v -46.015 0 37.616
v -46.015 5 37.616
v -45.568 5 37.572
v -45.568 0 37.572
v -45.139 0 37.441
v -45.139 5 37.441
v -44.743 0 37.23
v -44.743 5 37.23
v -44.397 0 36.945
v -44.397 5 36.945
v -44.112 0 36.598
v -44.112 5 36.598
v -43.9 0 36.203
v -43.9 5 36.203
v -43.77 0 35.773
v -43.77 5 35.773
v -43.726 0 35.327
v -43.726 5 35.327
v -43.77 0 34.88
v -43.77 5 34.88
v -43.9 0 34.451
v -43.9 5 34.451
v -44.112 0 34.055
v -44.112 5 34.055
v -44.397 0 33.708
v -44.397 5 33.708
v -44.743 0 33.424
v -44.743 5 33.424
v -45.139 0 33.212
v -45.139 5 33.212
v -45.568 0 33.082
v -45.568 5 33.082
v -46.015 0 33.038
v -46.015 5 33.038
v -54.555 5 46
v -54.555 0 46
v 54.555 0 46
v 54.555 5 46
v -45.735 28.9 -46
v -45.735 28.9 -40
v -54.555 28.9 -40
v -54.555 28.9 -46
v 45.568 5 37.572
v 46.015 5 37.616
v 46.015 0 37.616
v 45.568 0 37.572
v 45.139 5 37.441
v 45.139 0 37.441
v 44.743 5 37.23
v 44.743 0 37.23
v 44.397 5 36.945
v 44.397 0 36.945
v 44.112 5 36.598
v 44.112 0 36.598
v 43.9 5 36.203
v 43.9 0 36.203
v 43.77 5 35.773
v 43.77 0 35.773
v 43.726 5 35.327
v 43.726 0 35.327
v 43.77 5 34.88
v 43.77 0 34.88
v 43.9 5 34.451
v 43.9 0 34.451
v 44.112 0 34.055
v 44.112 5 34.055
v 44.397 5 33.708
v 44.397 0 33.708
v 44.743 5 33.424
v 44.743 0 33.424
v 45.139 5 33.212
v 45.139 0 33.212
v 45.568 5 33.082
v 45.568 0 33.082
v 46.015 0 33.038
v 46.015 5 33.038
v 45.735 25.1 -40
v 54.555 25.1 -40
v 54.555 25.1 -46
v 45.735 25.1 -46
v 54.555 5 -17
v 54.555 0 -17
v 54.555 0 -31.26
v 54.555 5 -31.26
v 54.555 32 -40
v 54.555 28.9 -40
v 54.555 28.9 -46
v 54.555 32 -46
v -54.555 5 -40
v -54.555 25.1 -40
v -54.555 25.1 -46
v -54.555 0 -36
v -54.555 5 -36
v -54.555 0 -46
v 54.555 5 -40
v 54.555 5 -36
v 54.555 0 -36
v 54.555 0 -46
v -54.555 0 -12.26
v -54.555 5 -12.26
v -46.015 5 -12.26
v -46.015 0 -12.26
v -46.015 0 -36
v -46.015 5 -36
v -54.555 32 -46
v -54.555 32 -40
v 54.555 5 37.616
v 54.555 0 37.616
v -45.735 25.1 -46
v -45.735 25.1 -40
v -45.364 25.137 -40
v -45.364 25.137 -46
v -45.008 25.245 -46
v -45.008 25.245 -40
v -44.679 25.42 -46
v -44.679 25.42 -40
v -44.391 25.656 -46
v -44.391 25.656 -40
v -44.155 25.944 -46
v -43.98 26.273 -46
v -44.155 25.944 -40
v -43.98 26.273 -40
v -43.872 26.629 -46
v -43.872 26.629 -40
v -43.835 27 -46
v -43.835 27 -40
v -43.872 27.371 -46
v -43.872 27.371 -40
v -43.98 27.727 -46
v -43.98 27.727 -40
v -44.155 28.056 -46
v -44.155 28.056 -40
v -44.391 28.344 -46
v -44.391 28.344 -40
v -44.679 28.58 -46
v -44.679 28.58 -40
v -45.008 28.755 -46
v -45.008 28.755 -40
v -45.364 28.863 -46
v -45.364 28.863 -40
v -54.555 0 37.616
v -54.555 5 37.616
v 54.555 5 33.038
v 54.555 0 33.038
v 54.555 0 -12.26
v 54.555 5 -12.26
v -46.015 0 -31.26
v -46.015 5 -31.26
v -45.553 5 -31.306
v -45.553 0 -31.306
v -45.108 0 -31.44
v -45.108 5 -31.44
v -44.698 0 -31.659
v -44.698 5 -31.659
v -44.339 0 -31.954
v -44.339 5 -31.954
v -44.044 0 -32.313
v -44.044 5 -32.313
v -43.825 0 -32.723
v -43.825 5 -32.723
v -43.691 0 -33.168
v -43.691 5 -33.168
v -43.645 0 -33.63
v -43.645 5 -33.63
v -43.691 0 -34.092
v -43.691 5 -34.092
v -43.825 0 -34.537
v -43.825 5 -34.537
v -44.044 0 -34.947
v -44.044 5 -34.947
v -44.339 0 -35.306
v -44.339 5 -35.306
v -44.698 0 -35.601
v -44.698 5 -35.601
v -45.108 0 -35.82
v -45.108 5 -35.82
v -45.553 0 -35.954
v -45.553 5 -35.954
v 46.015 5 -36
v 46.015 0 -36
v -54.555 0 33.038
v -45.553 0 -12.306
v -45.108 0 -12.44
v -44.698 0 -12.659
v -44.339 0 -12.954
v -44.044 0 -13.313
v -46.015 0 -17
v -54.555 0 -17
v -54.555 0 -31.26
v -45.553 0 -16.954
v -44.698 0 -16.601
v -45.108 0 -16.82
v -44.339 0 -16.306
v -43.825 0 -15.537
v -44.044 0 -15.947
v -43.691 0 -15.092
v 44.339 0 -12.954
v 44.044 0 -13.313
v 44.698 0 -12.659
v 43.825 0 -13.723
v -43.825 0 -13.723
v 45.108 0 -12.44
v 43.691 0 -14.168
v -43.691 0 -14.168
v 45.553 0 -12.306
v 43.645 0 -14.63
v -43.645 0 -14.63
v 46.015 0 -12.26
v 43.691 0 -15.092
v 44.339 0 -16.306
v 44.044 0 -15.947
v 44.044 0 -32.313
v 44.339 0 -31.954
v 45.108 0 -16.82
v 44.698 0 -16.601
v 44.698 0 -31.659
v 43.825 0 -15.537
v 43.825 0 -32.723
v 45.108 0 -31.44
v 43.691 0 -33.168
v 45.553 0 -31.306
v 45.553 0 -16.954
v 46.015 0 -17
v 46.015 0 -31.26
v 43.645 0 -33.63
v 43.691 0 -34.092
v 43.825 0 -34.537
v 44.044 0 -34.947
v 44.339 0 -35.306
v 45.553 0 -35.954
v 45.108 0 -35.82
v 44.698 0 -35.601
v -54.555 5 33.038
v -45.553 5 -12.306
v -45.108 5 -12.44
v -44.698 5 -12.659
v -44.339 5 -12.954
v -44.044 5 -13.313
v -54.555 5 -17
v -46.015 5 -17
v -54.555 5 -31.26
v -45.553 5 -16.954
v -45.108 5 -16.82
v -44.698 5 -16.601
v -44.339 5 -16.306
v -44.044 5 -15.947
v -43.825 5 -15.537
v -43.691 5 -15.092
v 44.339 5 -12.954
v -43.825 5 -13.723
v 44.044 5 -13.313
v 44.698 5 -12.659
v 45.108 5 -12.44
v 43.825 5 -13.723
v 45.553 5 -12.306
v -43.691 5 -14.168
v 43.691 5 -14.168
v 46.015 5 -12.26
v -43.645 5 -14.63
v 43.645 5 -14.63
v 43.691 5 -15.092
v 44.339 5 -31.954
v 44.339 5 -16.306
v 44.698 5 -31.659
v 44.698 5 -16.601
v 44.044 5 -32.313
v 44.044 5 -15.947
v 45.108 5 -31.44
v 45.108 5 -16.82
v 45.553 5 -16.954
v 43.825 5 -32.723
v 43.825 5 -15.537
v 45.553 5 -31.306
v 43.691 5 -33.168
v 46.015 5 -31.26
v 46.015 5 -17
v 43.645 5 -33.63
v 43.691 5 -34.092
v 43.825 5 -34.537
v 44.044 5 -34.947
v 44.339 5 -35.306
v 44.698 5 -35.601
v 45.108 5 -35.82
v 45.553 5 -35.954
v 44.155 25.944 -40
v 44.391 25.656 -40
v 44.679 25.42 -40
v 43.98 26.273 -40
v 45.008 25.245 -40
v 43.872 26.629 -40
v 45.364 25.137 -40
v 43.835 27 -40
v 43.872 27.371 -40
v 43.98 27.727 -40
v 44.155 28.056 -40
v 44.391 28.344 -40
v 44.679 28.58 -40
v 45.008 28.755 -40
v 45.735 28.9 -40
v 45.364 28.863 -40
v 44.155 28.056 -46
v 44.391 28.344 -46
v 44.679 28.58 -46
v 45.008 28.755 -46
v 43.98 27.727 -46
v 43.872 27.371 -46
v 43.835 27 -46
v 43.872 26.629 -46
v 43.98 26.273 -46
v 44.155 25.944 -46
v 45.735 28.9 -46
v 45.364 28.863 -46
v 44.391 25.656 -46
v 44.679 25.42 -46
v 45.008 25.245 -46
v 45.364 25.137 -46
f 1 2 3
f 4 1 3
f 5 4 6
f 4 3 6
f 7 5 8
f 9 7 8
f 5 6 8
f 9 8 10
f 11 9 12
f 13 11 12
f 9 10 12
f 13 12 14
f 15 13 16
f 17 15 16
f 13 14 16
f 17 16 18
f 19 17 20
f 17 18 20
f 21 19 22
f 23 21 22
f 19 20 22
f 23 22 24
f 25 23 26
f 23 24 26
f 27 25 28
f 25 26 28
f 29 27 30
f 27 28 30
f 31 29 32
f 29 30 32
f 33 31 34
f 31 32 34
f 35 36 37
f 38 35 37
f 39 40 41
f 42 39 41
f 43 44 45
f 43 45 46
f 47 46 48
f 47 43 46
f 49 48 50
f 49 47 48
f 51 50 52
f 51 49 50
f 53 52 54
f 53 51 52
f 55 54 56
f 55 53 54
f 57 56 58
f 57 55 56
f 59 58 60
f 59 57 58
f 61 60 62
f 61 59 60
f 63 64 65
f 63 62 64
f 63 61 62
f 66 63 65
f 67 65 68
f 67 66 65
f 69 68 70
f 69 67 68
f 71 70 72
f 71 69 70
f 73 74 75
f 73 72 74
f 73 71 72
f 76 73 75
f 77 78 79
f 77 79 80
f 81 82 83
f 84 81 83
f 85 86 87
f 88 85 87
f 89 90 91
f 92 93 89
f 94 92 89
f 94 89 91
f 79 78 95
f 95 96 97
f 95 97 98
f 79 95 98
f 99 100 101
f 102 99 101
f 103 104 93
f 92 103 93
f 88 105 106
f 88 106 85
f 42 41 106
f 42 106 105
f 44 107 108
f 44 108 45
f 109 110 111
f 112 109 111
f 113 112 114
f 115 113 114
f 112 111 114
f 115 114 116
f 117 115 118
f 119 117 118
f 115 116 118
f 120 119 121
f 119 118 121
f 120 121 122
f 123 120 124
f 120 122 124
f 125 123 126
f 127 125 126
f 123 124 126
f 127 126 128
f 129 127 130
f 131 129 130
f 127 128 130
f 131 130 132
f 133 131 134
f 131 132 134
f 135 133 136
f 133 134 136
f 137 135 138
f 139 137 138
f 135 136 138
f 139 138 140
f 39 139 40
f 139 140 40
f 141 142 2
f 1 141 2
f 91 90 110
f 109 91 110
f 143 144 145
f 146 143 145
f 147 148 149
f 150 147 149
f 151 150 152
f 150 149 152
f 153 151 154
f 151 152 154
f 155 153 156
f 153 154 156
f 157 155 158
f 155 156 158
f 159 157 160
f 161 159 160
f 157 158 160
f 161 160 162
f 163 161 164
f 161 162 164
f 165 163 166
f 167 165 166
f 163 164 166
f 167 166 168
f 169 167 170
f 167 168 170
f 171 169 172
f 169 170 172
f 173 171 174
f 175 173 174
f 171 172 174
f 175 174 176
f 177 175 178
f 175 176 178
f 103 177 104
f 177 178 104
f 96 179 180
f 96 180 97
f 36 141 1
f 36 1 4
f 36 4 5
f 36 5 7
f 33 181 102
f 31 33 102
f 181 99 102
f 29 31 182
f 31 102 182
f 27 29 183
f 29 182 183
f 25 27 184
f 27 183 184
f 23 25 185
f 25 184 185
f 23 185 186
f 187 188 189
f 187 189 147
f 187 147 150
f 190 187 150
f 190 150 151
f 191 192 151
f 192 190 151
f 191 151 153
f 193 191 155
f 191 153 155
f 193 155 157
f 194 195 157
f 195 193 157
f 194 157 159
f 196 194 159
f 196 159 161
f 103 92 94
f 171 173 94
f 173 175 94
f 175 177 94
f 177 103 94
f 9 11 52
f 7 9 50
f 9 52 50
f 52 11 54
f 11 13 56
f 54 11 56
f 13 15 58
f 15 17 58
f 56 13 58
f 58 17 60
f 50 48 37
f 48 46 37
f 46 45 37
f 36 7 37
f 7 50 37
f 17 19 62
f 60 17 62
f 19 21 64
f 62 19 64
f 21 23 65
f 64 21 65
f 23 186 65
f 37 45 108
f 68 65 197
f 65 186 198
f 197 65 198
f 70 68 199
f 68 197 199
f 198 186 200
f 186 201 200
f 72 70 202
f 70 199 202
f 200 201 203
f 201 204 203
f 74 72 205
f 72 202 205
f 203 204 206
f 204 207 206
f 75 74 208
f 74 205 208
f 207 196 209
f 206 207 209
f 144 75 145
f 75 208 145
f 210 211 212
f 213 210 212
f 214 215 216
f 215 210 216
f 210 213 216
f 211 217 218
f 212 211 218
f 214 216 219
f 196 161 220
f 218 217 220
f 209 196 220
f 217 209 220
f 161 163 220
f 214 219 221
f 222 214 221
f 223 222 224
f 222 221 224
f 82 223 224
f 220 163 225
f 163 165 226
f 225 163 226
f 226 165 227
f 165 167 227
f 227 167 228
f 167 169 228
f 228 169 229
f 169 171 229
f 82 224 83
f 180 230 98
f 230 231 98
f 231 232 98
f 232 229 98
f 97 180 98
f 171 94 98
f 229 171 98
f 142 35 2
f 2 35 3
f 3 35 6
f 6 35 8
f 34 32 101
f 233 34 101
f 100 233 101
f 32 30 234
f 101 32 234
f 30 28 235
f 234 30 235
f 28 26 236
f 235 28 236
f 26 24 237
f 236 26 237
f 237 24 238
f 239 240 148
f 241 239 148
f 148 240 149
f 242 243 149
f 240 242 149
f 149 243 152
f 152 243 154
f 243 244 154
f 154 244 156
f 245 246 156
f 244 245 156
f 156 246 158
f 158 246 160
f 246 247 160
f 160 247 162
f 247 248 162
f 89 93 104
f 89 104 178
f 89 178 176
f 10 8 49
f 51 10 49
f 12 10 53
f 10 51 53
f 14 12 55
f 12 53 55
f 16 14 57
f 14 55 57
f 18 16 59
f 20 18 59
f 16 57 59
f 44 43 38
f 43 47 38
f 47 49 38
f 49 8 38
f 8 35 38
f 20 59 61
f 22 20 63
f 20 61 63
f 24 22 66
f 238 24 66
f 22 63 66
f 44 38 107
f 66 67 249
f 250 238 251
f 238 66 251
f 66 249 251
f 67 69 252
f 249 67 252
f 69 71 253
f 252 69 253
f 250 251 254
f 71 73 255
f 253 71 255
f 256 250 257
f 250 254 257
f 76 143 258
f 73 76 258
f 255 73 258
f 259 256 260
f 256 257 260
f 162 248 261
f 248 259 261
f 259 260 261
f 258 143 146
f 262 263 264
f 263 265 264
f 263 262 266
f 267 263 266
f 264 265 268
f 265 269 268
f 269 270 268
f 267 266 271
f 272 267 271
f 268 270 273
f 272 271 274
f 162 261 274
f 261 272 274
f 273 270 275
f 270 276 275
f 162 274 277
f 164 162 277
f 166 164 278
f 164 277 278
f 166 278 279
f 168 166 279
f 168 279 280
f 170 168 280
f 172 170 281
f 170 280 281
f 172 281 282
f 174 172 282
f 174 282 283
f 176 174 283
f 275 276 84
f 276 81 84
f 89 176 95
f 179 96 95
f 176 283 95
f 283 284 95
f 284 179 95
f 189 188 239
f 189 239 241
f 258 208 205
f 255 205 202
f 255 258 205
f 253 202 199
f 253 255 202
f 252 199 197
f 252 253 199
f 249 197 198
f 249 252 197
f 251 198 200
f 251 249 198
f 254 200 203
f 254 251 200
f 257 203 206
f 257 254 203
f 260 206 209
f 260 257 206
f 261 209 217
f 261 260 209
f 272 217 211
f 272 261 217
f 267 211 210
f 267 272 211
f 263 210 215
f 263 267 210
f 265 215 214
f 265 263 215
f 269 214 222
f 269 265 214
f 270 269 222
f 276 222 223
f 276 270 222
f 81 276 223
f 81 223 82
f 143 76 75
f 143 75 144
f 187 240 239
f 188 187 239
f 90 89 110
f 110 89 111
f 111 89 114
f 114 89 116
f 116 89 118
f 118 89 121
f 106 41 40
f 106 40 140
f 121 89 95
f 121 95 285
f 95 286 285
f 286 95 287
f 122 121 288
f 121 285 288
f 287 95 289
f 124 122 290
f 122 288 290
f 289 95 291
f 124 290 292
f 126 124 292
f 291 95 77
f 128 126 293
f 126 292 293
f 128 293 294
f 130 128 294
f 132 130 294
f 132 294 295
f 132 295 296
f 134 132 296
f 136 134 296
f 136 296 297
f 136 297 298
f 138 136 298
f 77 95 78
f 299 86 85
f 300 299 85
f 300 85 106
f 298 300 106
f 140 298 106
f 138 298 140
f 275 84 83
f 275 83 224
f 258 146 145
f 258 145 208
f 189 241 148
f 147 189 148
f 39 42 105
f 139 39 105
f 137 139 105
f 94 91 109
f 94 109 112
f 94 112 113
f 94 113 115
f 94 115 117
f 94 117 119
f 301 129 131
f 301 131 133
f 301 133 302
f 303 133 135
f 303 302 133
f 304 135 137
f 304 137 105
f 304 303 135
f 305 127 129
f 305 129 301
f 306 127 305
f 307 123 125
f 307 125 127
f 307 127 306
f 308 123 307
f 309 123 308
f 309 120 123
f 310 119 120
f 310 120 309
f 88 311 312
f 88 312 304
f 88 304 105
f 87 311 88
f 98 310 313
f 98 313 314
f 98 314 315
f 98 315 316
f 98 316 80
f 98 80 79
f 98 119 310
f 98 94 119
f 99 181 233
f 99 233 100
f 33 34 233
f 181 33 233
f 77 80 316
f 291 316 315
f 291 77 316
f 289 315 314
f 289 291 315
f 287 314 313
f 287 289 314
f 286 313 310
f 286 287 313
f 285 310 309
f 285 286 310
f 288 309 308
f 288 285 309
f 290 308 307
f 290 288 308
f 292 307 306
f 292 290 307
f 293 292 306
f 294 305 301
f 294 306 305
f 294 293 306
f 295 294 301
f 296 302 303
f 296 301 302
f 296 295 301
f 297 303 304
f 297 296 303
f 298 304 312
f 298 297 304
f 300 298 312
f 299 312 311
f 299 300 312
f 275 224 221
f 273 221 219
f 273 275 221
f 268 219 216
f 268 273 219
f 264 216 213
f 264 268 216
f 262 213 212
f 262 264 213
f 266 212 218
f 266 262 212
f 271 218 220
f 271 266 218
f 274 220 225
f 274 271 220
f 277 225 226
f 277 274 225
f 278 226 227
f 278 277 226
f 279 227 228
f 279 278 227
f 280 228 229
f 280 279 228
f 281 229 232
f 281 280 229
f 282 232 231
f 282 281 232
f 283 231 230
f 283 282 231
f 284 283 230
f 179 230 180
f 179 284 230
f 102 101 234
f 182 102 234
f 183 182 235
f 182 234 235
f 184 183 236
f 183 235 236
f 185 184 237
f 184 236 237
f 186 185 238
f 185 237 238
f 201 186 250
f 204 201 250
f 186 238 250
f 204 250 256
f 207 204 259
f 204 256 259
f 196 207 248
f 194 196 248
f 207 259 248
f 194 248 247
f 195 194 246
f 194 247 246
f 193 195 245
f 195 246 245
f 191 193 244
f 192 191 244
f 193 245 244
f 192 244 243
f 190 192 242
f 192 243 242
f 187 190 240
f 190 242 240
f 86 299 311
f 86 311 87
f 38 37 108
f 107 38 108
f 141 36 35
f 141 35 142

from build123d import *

# Parameters (mm, degrees)
CROQUIS1_W              = 109.11
CROQUIS1_H              = 92
SALIENTE_EXTRUIR1_DEPTH = 32
CROQUIS2_W              = 86
CROQUIS2_H              = 27
CORTAR_EXTRUIR1_DEPTH   = 123.658029089
CORTAR_EXTRUIR2_DEPTH   = 107.753210842
CORTAR_EXTRUIR4_DEPTH   = 77.297103648


with BuildPart() as part:
    # Croquis1 → Saliente-Extruir1 (new body)
    with BuildSketch(Plane(origin=(0, 0, 0), x_dir=(1, 0, 0), z_dir=(0, 1, 0))):
        Rectangle(CROQUIS1_W, CROQUIS1_H)
    extrude(amount=SALIENTE_EXTRUIR1_DEPTH)

    # Croquis2 → Cortar-Extruir1 (cut, through all)
    with BuildSketch(Plane(origin=(54.555, 0, 0), x_dir=(0, 0, -1), z_dir=(1, 0, 0))):
        with Locations((-3, 18.5)):
            Rectangle(CROQUIS2_W, CROQUIS2_H)
    extrude(amount=-CORTAR_EXTRUIR1_DEPTH, mode=Mode.SUBTRACT)

    # Croquis3 → Cortar-Extruir2 (cut, through all)
    with BuildSketch(Plane.XY.offset(-40)):
        with BuildLine():
            Line((45.735, 28.9), (54.555, 28.9))
            Line((54.555, 28.9), (54.555, 25.1))
            Line((54.555, 25.1), (45.735, 25.1))
            ThreePointArc((45.735, 25.1), (43.835, 27), (45.735, 28.9))
        make_face()
        with BuildLine():
            Line((-45.735, 28.9), (-54.555, 28.9))
            Line((-54.555, 28.9), (-54.555, 25.1))
            Line((-54.555, 25.1), (-45.735, 25.1))
            ThreePointArc((-45.735, 25.1), (-43.835, 27), (-45.735, 28.9))
        make_face()
    extrude(amount=-CORTAR_EXTRUIR2_DEPTH, mode=Mode.SUBTRACT)

    # Croquis4 → Cortar-Extruir4 (cut, through all)
    with BuildSketch(Plane(origin=(0, 5, 0), x_dir=(1, 0, 0), z_dir=(0, 1, 0))):
        with BuildLine():
            Line((-46.015, 36), (-54.555, 36))
            Line((-54.555, 36), (-54.555, 31.26))
            Line((-54.555, 31.26), (-46.015, 31.26))
            ThreePointArc((-46.015, 31.26), (-43.645, 33.63), (-46.015, 36))
        make_face()
        with BuildLine():
            Line((-46.015, 17), (-54.555, 17))
            Line((-54.555, 17), (-54.555, 12.26))
            Line((-54.555, 12.26), (-46.015, 12.26))
            ThreePointArc((-46.015, 12.26), (-43.645, 14.63), (-46.015, 17))
        make_face()
        with BuildLine():
            Line((-46.015, -33.037861791), (-54.555, -33.037861791))
            Line((-54.555, -33.037861791), (-54.555, -37.615607647))
            Line((-54.555, -37.615607647), (-46.015, -37.615607647))
            ThreePointArc((-46.015, -37.615607647), (-43.726127072, -35.326734719), (-46.015, -33.037861791))
        make_face()
        with BuildLine():
            Line((54.555, -37.615607647), (46.015, -37.615607647))
            ThreePointArc((46.015, -37.615607647), (43.726127072, -35.326734719), (46.015, -33.037861791))
            Line((46.015, -33.037861791), (54.555, -33.037861791))
            Line((54.555, -33.037861791), (54.555, -37.615607647))
        make_face()
        with BuildLine():
            Line((54.555, 17), (54.555, 12.26))
            Line((54.555, 12.26), (46.015, 12.26))
            ThreePointArc((46.015, 12.26), (43.645, 14.63), (46.015, 17))
            Line((46.015, 17), (54.555, 17))
        make_face()
        with BuildLine():
            Line((54.555, 31.26), (46.015, 31.26))
            ThreePointArc((46.015, 31.26), (43.645, 33.63), (46.015, 36))
            Line((46.015, 36), (54.555, 36))
            Line((54.555, 36), (54.555, 31.26))
        make_face()
    extrude(amount=-CORTAR_EXTRUIR4_DEPTH, mode=Mode.SUBTRACT)


solid = part.part
